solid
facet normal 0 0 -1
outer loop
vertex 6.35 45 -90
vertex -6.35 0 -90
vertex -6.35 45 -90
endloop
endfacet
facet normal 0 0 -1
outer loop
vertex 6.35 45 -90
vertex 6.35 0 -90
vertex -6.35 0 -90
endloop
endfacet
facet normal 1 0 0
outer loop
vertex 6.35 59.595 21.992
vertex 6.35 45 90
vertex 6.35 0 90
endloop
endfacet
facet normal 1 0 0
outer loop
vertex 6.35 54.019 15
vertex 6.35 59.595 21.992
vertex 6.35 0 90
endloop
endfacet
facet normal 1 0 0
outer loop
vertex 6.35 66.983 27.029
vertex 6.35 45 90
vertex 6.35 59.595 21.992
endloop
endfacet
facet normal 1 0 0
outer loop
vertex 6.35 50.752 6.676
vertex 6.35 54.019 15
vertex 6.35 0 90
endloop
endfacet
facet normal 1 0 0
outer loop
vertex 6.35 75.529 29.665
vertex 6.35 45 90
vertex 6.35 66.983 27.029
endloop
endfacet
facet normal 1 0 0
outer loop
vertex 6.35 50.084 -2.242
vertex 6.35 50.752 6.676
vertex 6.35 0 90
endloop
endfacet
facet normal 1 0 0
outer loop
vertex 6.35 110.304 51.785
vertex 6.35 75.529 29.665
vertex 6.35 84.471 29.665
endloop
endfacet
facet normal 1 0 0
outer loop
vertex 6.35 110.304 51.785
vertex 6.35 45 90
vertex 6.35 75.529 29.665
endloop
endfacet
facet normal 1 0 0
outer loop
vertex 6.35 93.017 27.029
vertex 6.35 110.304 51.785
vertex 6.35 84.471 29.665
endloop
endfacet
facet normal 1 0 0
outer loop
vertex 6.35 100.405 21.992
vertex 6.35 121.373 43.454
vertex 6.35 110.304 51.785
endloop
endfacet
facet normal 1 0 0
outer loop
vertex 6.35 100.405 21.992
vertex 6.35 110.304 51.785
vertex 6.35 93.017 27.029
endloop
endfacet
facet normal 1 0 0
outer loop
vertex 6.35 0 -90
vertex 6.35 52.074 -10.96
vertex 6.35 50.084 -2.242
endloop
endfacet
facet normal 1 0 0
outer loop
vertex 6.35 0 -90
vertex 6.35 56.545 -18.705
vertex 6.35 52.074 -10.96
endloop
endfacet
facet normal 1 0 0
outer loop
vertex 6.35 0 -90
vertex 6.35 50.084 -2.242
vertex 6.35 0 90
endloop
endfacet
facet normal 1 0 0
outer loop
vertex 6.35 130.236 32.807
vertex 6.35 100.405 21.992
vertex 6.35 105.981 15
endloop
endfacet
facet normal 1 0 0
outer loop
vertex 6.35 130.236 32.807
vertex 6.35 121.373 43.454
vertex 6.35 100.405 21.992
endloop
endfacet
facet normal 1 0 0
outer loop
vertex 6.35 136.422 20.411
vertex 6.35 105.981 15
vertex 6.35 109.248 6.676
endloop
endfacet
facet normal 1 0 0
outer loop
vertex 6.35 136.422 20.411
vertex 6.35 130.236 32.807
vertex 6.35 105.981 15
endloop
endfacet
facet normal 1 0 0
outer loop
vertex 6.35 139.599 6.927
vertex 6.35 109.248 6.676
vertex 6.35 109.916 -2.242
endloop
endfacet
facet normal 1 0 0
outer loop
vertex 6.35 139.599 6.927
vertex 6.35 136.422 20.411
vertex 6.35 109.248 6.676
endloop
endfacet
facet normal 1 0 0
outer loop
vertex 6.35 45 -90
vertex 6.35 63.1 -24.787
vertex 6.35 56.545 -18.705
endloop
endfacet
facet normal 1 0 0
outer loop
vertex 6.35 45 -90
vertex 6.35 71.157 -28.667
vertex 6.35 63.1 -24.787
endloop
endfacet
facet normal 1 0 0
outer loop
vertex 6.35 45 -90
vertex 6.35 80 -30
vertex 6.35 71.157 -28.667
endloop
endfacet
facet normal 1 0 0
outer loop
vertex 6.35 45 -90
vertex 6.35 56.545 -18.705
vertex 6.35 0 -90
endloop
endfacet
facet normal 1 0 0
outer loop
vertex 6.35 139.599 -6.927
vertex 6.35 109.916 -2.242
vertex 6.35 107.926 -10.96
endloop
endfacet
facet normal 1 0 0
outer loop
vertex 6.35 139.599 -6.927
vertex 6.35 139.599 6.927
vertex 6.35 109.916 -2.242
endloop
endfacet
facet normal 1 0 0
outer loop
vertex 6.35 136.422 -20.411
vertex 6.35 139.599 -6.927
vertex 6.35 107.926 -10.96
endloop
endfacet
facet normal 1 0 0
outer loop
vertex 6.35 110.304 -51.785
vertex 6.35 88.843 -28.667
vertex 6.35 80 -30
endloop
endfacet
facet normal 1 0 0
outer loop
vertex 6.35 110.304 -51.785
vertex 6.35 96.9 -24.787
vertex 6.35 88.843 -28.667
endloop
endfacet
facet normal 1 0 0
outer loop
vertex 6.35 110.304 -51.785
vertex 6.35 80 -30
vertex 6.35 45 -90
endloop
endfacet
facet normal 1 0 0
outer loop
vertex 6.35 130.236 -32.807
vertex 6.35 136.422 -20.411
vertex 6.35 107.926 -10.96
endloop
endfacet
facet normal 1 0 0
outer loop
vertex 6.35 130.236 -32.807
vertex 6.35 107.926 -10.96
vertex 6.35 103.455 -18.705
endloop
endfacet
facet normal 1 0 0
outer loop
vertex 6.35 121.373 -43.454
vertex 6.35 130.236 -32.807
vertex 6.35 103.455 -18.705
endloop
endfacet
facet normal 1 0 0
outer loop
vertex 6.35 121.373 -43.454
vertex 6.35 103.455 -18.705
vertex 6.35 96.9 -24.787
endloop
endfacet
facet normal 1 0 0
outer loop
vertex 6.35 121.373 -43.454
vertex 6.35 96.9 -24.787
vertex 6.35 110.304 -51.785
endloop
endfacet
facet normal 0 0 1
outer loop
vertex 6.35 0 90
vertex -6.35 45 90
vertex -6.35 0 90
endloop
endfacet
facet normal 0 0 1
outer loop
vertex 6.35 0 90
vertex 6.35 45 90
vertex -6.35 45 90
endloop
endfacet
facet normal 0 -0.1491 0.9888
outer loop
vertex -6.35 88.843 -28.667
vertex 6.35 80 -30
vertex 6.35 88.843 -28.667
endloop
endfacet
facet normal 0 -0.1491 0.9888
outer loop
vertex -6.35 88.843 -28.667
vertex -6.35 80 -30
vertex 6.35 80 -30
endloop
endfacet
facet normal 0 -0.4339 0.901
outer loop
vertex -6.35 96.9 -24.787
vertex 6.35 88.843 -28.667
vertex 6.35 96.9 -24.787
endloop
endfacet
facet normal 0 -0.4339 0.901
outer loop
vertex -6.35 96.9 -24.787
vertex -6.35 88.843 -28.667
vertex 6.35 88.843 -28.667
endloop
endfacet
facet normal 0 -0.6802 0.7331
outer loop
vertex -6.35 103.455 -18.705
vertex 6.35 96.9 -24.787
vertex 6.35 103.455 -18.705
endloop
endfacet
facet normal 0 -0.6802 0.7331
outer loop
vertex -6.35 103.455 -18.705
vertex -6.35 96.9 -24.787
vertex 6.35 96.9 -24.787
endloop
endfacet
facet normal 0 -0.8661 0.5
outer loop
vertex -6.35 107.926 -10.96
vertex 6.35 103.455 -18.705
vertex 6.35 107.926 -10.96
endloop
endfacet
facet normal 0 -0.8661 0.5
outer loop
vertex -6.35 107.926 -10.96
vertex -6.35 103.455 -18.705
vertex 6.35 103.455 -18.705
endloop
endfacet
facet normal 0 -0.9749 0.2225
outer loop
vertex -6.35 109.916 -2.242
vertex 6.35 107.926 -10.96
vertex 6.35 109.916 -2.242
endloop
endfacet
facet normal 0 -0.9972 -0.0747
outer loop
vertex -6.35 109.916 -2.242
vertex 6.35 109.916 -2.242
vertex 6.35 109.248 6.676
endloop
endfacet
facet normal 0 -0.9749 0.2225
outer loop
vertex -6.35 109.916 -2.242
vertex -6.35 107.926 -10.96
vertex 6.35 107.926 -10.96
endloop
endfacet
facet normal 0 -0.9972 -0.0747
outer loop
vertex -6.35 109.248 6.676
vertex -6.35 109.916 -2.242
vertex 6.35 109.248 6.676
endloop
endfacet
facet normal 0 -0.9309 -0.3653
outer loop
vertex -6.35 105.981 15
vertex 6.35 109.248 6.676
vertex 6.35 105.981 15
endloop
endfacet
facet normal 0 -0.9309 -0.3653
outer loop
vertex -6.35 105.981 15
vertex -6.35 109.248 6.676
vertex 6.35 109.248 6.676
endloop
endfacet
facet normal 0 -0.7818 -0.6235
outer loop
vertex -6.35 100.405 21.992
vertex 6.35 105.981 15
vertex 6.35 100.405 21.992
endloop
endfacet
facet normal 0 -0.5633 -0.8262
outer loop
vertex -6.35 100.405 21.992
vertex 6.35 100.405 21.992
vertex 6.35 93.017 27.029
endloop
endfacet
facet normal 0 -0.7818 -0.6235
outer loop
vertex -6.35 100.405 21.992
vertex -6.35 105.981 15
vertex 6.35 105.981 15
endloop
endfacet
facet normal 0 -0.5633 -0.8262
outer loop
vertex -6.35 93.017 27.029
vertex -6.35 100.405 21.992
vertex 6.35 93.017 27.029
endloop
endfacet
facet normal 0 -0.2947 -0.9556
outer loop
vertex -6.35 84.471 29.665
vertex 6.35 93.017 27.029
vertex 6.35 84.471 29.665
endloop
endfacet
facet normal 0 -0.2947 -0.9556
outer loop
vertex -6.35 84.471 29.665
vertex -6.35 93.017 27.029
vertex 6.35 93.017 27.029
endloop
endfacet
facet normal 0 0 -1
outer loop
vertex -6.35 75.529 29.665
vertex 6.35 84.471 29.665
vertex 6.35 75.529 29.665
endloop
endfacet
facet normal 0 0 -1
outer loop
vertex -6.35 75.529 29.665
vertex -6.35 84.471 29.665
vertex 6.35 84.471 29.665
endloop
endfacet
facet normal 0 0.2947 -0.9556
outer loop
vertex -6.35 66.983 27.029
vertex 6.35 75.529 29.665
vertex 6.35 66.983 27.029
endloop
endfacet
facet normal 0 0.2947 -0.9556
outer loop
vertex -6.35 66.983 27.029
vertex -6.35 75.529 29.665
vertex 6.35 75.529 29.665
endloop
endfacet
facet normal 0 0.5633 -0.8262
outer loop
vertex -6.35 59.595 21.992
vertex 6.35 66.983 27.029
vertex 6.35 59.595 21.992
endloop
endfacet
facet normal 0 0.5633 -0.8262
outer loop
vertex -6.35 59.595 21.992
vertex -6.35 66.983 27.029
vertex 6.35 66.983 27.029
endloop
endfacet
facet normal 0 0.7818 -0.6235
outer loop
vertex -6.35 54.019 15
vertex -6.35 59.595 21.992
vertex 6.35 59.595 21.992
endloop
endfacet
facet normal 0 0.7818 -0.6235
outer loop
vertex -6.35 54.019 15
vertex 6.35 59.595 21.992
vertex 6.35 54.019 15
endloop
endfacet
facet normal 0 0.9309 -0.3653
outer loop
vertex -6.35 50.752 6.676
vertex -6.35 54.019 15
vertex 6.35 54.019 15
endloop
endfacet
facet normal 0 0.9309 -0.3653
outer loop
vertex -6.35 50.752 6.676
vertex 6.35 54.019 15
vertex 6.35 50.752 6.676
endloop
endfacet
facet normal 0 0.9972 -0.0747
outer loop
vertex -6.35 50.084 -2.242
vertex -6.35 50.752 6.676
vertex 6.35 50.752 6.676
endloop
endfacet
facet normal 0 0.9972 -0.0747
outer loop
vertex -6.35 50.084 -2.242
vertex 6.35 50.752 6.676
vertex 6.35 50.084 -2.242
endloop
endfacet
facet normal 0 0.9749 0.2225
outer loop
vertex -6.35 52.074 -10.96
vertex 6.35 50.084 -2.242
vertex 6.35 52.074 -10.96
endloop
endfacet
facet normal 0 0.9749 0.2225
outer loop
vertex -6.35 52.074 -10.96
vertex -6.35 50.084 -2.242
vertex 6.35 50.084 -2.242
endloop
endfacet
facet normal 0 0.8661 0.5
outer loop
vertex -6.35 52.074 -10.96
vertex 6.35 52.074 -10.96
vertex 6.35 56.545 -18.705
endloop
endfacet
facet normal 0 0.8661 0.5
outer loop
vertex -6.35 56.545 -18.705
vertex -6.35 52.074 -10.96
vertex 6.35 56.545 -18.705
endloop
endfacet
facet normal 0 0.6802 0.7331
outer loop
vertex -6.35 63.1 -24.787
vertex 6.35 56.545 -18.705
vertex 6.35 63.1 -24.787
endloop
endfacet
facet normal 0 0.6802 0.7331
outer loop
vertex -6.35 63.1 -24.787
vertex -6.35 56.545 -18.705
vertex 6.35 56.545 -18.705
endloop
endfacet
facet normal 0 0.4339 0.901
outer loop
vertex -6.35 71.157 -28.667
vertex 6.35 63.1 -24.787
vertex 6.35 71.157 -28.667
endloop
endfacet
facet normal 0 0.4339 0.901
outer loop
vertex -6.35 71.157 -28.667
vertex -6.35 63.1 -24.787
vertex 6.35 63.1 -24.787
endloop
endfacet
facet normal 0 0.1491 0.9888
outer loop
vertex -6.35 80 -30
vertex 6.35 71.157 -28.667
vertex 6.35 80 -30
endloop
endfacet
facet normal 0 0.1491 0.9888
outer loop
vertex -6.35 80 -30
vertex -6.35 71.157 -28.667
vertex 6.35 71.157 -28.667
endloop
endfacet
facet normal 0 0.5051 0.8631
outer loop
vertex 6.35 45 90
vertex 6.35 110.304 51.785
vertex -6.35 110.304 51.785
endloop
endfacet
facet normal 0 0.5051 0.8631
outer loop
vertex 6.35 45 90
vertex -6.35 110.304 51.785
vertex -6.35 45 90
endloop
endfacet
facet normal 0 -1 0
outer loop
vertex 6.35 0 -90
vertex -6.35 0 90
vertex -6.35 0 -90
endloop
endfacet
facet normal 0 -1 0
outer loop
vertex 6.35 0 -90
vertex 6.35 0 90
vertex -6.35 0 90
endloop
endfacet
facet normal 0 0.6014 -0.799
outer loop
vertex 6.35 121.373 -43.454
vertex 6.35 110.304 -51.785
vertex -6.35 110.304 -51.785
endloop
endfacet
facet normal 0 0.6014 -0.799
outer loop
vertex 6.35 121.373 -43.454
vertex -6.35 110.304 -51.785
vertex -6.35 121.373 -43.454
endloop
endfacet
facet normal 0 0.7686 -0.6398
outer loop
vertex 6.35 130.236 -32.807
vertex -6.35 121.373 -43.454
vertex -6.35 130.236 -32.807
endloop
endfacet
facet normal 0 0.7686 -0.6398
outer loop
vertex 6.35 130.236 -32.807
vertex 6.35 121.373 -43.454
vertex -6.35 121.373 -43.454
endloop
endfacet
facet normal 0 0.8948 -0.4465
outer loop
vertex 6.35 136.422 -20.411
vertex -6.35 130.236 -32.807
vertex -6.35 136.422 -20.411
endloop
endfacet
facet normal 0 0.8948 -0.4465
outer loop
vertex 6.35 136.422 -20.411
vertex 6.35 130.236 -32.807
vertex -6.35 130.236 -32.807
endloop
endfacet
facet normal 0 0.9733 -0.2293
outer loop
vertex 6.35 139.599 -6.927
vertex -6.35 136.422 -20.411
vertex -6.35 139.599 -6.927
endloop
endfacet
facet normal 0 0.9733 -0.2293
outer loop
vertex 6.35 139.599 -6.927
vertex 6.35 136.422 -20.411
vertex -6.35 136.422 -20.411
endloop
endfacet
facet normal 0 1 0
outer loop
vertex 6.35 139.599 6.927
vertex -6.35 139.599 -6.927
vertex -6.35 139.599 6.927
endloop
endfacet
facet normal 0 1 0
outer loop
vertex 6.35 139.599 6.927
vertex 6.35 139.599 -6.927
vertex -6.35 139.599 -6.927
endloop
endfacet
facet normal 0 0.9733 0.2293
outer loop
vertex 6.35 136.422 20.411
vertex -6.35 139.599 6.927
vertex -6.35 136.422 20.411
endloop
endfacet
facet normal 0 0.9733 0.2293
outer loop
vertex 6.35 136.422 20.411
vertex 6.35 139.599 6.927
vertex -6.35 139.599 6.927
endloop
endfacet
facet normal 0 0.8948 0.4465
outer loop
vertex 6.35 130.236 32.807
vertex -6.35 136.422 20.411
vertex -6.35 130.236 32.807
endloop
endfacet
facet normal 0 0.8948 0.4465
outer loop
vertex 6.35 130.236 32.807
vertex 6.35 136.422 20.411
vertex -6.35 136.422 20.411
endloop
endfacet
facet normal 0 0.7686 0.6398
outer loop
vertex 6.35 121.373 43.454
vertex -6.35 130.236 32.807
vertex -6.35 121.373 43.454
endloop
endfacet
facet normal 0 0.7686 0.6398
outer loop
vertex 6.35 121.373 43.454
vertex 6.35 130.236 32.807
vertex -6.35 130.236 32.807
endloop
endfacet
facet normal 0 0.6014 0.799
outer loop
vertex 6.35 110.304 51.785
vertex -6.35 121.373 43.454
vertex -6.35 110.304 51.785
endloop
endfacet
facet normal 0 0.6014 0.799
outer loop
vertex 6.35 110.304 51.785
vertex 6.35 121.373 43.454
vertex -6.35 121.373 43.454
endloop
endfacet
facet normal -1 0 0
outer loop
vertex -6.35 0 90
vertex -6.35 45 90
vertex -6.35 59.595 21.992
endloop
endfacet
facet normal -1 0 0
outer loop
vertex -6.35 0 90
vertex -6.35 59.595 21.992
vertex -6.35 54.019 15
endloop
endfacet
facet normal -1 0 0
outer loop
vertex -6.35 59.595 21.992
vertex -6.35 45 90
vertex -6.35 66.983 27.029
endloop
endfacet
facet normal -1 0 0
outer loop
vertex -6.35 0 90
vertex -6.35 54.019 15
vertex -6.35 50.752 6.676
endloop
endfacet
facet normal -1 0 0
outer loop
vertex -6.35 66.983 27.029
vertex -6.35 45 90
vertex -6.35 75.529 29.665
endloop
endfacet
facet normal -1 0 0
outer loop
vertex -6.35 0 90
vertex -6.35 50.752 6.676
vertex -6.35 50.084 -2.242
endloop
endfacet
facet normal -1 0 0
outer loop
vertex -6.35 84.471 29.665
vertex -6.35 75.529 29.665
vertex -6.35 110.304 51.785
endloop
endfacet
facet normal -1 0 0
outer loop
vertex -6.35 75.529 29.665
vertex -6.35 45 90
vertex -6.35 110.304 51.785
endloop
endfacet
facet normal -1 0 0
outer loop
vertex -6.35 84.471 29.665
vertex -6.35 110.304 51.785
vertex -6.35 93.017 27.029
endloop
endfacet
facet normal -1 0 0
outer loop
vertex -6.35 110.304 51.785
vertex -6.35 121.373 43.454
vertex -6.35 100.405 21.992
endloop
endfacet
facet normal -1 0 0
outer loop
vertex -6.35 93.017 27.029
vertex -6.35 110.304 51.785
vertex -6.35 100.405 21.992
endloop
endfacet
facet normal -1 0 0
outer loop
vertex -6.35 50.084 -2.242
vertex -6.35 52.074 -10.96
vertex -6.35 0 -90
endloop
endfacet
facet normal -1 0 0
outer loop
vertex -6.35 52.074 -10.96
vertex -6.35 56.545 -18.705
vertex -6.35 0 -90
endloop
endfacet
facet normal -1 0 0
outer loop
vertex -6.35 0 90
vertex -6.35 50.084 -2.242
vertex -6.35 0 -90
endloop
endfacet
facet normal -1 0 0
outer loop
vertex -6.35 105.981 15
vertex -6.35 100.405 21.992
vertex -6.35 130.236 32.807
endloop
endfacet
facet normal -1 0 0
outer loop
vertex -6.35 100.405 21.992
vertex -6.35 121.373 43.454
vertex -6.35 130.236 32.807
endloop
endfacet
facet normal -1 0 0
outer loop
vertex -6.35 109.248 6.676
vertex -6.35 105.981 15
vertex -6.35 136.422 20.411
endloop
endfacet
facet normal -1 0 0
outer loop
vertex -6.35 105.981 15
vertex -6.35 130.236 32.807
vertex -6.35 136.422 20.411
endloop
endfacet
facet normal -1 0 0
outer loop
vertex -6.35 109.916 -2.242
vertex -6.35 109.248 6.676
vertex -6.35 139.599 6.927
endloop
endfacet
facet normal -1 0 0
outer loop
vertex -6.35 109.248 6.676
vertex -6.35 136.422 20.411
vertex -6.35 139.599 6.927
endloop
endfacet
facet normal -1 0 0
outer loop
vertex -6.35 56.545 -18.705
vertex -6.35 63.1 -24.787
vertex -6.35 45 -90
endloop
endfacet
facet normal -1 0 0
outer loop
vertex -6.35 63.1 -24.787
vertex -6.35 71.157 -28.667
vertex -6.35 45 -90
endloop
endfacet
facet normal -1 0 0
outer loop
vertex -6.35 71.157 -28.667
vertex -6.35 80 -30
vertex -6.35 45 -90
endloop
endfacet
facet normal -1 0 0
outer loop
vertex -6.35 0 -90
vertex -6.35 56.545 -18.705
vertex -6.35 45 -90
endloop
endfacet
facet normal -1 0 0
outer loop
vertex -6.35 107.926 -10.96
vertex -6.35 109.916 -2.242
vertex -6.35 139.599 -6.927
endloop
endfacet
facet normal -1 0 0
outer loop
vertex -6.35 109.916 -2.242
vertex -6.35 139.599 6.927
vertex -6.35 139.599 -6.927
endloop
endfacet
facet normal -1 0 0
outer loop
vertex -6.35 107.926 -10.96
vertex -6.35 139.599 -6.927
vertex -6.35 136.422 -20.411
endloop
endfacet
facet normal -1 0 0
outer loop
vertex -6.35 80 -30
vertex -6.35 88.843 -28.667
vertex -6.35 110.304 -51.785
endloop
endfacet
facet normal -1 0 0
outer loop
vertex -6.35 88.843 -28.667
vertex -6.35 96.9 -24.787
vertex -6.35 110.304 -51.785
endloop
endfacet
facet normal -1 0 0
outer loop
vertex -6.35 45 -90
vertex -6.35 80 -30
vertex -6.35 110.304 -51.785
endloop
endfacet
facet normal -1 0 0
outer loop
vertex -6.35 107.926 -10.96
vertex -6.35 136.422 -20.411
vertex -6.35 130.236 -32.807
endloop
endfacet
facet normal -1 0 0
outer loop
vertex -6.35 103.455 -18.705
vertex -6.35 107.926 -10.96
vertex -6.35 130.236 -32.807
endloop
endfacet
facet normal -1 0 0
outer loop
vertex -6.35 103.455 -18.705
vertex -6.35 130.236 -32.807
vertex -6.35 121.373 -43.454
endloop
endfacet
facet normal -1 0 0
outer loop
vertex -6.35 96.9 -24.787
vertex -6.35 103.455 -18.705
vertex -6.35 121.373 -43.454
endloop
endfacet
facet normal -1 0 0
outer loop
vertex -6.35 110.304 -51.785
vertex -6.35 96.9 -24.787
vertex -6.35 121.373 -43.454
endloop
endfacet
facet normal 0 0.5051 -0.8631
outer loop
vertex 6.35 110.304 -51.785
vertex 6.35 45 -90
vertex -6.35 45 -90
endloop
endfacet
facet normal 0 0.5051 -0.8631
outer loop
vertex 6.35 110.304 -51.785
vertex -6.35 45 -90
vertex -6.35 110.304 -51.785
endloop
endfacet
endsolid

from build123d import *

# Parameters (mm, degrees)
SKETCH1_R           = 30
BOSS_EXTRUDE1_DEPTH = 6.35


with BuildPart() as part:
    # Sketch1 → Boss-Extrude1 (new, symmetric)
    with BuildSketch(Plane(origin=(0, 0, 0), x_dir=(0, 0, -1), z_dir=(1, 0, 0))):
        with BuildLine():
            Line((90, 0), (90, 45))
            Line((90, 45), (51.784861392, 110.303929293))
            ThreePointArc((51.784861392, 110.303929293), (0, 140), (-51.784861392, 110.303929293))
            Line((-51.784861392, 110.303929293), (-90, 45))
            Line((-90, 45), (-90, 0))
            Line((-90, 0), (90, 0))
        make_face()
        with Locations((0, 80)):
            Circle(SKETCH1_R, mode=Mode.SUBTRACT)
    extrude(amount=BOSS_EXTRUDE1_DEPTH, both=True)


solid = part.part
